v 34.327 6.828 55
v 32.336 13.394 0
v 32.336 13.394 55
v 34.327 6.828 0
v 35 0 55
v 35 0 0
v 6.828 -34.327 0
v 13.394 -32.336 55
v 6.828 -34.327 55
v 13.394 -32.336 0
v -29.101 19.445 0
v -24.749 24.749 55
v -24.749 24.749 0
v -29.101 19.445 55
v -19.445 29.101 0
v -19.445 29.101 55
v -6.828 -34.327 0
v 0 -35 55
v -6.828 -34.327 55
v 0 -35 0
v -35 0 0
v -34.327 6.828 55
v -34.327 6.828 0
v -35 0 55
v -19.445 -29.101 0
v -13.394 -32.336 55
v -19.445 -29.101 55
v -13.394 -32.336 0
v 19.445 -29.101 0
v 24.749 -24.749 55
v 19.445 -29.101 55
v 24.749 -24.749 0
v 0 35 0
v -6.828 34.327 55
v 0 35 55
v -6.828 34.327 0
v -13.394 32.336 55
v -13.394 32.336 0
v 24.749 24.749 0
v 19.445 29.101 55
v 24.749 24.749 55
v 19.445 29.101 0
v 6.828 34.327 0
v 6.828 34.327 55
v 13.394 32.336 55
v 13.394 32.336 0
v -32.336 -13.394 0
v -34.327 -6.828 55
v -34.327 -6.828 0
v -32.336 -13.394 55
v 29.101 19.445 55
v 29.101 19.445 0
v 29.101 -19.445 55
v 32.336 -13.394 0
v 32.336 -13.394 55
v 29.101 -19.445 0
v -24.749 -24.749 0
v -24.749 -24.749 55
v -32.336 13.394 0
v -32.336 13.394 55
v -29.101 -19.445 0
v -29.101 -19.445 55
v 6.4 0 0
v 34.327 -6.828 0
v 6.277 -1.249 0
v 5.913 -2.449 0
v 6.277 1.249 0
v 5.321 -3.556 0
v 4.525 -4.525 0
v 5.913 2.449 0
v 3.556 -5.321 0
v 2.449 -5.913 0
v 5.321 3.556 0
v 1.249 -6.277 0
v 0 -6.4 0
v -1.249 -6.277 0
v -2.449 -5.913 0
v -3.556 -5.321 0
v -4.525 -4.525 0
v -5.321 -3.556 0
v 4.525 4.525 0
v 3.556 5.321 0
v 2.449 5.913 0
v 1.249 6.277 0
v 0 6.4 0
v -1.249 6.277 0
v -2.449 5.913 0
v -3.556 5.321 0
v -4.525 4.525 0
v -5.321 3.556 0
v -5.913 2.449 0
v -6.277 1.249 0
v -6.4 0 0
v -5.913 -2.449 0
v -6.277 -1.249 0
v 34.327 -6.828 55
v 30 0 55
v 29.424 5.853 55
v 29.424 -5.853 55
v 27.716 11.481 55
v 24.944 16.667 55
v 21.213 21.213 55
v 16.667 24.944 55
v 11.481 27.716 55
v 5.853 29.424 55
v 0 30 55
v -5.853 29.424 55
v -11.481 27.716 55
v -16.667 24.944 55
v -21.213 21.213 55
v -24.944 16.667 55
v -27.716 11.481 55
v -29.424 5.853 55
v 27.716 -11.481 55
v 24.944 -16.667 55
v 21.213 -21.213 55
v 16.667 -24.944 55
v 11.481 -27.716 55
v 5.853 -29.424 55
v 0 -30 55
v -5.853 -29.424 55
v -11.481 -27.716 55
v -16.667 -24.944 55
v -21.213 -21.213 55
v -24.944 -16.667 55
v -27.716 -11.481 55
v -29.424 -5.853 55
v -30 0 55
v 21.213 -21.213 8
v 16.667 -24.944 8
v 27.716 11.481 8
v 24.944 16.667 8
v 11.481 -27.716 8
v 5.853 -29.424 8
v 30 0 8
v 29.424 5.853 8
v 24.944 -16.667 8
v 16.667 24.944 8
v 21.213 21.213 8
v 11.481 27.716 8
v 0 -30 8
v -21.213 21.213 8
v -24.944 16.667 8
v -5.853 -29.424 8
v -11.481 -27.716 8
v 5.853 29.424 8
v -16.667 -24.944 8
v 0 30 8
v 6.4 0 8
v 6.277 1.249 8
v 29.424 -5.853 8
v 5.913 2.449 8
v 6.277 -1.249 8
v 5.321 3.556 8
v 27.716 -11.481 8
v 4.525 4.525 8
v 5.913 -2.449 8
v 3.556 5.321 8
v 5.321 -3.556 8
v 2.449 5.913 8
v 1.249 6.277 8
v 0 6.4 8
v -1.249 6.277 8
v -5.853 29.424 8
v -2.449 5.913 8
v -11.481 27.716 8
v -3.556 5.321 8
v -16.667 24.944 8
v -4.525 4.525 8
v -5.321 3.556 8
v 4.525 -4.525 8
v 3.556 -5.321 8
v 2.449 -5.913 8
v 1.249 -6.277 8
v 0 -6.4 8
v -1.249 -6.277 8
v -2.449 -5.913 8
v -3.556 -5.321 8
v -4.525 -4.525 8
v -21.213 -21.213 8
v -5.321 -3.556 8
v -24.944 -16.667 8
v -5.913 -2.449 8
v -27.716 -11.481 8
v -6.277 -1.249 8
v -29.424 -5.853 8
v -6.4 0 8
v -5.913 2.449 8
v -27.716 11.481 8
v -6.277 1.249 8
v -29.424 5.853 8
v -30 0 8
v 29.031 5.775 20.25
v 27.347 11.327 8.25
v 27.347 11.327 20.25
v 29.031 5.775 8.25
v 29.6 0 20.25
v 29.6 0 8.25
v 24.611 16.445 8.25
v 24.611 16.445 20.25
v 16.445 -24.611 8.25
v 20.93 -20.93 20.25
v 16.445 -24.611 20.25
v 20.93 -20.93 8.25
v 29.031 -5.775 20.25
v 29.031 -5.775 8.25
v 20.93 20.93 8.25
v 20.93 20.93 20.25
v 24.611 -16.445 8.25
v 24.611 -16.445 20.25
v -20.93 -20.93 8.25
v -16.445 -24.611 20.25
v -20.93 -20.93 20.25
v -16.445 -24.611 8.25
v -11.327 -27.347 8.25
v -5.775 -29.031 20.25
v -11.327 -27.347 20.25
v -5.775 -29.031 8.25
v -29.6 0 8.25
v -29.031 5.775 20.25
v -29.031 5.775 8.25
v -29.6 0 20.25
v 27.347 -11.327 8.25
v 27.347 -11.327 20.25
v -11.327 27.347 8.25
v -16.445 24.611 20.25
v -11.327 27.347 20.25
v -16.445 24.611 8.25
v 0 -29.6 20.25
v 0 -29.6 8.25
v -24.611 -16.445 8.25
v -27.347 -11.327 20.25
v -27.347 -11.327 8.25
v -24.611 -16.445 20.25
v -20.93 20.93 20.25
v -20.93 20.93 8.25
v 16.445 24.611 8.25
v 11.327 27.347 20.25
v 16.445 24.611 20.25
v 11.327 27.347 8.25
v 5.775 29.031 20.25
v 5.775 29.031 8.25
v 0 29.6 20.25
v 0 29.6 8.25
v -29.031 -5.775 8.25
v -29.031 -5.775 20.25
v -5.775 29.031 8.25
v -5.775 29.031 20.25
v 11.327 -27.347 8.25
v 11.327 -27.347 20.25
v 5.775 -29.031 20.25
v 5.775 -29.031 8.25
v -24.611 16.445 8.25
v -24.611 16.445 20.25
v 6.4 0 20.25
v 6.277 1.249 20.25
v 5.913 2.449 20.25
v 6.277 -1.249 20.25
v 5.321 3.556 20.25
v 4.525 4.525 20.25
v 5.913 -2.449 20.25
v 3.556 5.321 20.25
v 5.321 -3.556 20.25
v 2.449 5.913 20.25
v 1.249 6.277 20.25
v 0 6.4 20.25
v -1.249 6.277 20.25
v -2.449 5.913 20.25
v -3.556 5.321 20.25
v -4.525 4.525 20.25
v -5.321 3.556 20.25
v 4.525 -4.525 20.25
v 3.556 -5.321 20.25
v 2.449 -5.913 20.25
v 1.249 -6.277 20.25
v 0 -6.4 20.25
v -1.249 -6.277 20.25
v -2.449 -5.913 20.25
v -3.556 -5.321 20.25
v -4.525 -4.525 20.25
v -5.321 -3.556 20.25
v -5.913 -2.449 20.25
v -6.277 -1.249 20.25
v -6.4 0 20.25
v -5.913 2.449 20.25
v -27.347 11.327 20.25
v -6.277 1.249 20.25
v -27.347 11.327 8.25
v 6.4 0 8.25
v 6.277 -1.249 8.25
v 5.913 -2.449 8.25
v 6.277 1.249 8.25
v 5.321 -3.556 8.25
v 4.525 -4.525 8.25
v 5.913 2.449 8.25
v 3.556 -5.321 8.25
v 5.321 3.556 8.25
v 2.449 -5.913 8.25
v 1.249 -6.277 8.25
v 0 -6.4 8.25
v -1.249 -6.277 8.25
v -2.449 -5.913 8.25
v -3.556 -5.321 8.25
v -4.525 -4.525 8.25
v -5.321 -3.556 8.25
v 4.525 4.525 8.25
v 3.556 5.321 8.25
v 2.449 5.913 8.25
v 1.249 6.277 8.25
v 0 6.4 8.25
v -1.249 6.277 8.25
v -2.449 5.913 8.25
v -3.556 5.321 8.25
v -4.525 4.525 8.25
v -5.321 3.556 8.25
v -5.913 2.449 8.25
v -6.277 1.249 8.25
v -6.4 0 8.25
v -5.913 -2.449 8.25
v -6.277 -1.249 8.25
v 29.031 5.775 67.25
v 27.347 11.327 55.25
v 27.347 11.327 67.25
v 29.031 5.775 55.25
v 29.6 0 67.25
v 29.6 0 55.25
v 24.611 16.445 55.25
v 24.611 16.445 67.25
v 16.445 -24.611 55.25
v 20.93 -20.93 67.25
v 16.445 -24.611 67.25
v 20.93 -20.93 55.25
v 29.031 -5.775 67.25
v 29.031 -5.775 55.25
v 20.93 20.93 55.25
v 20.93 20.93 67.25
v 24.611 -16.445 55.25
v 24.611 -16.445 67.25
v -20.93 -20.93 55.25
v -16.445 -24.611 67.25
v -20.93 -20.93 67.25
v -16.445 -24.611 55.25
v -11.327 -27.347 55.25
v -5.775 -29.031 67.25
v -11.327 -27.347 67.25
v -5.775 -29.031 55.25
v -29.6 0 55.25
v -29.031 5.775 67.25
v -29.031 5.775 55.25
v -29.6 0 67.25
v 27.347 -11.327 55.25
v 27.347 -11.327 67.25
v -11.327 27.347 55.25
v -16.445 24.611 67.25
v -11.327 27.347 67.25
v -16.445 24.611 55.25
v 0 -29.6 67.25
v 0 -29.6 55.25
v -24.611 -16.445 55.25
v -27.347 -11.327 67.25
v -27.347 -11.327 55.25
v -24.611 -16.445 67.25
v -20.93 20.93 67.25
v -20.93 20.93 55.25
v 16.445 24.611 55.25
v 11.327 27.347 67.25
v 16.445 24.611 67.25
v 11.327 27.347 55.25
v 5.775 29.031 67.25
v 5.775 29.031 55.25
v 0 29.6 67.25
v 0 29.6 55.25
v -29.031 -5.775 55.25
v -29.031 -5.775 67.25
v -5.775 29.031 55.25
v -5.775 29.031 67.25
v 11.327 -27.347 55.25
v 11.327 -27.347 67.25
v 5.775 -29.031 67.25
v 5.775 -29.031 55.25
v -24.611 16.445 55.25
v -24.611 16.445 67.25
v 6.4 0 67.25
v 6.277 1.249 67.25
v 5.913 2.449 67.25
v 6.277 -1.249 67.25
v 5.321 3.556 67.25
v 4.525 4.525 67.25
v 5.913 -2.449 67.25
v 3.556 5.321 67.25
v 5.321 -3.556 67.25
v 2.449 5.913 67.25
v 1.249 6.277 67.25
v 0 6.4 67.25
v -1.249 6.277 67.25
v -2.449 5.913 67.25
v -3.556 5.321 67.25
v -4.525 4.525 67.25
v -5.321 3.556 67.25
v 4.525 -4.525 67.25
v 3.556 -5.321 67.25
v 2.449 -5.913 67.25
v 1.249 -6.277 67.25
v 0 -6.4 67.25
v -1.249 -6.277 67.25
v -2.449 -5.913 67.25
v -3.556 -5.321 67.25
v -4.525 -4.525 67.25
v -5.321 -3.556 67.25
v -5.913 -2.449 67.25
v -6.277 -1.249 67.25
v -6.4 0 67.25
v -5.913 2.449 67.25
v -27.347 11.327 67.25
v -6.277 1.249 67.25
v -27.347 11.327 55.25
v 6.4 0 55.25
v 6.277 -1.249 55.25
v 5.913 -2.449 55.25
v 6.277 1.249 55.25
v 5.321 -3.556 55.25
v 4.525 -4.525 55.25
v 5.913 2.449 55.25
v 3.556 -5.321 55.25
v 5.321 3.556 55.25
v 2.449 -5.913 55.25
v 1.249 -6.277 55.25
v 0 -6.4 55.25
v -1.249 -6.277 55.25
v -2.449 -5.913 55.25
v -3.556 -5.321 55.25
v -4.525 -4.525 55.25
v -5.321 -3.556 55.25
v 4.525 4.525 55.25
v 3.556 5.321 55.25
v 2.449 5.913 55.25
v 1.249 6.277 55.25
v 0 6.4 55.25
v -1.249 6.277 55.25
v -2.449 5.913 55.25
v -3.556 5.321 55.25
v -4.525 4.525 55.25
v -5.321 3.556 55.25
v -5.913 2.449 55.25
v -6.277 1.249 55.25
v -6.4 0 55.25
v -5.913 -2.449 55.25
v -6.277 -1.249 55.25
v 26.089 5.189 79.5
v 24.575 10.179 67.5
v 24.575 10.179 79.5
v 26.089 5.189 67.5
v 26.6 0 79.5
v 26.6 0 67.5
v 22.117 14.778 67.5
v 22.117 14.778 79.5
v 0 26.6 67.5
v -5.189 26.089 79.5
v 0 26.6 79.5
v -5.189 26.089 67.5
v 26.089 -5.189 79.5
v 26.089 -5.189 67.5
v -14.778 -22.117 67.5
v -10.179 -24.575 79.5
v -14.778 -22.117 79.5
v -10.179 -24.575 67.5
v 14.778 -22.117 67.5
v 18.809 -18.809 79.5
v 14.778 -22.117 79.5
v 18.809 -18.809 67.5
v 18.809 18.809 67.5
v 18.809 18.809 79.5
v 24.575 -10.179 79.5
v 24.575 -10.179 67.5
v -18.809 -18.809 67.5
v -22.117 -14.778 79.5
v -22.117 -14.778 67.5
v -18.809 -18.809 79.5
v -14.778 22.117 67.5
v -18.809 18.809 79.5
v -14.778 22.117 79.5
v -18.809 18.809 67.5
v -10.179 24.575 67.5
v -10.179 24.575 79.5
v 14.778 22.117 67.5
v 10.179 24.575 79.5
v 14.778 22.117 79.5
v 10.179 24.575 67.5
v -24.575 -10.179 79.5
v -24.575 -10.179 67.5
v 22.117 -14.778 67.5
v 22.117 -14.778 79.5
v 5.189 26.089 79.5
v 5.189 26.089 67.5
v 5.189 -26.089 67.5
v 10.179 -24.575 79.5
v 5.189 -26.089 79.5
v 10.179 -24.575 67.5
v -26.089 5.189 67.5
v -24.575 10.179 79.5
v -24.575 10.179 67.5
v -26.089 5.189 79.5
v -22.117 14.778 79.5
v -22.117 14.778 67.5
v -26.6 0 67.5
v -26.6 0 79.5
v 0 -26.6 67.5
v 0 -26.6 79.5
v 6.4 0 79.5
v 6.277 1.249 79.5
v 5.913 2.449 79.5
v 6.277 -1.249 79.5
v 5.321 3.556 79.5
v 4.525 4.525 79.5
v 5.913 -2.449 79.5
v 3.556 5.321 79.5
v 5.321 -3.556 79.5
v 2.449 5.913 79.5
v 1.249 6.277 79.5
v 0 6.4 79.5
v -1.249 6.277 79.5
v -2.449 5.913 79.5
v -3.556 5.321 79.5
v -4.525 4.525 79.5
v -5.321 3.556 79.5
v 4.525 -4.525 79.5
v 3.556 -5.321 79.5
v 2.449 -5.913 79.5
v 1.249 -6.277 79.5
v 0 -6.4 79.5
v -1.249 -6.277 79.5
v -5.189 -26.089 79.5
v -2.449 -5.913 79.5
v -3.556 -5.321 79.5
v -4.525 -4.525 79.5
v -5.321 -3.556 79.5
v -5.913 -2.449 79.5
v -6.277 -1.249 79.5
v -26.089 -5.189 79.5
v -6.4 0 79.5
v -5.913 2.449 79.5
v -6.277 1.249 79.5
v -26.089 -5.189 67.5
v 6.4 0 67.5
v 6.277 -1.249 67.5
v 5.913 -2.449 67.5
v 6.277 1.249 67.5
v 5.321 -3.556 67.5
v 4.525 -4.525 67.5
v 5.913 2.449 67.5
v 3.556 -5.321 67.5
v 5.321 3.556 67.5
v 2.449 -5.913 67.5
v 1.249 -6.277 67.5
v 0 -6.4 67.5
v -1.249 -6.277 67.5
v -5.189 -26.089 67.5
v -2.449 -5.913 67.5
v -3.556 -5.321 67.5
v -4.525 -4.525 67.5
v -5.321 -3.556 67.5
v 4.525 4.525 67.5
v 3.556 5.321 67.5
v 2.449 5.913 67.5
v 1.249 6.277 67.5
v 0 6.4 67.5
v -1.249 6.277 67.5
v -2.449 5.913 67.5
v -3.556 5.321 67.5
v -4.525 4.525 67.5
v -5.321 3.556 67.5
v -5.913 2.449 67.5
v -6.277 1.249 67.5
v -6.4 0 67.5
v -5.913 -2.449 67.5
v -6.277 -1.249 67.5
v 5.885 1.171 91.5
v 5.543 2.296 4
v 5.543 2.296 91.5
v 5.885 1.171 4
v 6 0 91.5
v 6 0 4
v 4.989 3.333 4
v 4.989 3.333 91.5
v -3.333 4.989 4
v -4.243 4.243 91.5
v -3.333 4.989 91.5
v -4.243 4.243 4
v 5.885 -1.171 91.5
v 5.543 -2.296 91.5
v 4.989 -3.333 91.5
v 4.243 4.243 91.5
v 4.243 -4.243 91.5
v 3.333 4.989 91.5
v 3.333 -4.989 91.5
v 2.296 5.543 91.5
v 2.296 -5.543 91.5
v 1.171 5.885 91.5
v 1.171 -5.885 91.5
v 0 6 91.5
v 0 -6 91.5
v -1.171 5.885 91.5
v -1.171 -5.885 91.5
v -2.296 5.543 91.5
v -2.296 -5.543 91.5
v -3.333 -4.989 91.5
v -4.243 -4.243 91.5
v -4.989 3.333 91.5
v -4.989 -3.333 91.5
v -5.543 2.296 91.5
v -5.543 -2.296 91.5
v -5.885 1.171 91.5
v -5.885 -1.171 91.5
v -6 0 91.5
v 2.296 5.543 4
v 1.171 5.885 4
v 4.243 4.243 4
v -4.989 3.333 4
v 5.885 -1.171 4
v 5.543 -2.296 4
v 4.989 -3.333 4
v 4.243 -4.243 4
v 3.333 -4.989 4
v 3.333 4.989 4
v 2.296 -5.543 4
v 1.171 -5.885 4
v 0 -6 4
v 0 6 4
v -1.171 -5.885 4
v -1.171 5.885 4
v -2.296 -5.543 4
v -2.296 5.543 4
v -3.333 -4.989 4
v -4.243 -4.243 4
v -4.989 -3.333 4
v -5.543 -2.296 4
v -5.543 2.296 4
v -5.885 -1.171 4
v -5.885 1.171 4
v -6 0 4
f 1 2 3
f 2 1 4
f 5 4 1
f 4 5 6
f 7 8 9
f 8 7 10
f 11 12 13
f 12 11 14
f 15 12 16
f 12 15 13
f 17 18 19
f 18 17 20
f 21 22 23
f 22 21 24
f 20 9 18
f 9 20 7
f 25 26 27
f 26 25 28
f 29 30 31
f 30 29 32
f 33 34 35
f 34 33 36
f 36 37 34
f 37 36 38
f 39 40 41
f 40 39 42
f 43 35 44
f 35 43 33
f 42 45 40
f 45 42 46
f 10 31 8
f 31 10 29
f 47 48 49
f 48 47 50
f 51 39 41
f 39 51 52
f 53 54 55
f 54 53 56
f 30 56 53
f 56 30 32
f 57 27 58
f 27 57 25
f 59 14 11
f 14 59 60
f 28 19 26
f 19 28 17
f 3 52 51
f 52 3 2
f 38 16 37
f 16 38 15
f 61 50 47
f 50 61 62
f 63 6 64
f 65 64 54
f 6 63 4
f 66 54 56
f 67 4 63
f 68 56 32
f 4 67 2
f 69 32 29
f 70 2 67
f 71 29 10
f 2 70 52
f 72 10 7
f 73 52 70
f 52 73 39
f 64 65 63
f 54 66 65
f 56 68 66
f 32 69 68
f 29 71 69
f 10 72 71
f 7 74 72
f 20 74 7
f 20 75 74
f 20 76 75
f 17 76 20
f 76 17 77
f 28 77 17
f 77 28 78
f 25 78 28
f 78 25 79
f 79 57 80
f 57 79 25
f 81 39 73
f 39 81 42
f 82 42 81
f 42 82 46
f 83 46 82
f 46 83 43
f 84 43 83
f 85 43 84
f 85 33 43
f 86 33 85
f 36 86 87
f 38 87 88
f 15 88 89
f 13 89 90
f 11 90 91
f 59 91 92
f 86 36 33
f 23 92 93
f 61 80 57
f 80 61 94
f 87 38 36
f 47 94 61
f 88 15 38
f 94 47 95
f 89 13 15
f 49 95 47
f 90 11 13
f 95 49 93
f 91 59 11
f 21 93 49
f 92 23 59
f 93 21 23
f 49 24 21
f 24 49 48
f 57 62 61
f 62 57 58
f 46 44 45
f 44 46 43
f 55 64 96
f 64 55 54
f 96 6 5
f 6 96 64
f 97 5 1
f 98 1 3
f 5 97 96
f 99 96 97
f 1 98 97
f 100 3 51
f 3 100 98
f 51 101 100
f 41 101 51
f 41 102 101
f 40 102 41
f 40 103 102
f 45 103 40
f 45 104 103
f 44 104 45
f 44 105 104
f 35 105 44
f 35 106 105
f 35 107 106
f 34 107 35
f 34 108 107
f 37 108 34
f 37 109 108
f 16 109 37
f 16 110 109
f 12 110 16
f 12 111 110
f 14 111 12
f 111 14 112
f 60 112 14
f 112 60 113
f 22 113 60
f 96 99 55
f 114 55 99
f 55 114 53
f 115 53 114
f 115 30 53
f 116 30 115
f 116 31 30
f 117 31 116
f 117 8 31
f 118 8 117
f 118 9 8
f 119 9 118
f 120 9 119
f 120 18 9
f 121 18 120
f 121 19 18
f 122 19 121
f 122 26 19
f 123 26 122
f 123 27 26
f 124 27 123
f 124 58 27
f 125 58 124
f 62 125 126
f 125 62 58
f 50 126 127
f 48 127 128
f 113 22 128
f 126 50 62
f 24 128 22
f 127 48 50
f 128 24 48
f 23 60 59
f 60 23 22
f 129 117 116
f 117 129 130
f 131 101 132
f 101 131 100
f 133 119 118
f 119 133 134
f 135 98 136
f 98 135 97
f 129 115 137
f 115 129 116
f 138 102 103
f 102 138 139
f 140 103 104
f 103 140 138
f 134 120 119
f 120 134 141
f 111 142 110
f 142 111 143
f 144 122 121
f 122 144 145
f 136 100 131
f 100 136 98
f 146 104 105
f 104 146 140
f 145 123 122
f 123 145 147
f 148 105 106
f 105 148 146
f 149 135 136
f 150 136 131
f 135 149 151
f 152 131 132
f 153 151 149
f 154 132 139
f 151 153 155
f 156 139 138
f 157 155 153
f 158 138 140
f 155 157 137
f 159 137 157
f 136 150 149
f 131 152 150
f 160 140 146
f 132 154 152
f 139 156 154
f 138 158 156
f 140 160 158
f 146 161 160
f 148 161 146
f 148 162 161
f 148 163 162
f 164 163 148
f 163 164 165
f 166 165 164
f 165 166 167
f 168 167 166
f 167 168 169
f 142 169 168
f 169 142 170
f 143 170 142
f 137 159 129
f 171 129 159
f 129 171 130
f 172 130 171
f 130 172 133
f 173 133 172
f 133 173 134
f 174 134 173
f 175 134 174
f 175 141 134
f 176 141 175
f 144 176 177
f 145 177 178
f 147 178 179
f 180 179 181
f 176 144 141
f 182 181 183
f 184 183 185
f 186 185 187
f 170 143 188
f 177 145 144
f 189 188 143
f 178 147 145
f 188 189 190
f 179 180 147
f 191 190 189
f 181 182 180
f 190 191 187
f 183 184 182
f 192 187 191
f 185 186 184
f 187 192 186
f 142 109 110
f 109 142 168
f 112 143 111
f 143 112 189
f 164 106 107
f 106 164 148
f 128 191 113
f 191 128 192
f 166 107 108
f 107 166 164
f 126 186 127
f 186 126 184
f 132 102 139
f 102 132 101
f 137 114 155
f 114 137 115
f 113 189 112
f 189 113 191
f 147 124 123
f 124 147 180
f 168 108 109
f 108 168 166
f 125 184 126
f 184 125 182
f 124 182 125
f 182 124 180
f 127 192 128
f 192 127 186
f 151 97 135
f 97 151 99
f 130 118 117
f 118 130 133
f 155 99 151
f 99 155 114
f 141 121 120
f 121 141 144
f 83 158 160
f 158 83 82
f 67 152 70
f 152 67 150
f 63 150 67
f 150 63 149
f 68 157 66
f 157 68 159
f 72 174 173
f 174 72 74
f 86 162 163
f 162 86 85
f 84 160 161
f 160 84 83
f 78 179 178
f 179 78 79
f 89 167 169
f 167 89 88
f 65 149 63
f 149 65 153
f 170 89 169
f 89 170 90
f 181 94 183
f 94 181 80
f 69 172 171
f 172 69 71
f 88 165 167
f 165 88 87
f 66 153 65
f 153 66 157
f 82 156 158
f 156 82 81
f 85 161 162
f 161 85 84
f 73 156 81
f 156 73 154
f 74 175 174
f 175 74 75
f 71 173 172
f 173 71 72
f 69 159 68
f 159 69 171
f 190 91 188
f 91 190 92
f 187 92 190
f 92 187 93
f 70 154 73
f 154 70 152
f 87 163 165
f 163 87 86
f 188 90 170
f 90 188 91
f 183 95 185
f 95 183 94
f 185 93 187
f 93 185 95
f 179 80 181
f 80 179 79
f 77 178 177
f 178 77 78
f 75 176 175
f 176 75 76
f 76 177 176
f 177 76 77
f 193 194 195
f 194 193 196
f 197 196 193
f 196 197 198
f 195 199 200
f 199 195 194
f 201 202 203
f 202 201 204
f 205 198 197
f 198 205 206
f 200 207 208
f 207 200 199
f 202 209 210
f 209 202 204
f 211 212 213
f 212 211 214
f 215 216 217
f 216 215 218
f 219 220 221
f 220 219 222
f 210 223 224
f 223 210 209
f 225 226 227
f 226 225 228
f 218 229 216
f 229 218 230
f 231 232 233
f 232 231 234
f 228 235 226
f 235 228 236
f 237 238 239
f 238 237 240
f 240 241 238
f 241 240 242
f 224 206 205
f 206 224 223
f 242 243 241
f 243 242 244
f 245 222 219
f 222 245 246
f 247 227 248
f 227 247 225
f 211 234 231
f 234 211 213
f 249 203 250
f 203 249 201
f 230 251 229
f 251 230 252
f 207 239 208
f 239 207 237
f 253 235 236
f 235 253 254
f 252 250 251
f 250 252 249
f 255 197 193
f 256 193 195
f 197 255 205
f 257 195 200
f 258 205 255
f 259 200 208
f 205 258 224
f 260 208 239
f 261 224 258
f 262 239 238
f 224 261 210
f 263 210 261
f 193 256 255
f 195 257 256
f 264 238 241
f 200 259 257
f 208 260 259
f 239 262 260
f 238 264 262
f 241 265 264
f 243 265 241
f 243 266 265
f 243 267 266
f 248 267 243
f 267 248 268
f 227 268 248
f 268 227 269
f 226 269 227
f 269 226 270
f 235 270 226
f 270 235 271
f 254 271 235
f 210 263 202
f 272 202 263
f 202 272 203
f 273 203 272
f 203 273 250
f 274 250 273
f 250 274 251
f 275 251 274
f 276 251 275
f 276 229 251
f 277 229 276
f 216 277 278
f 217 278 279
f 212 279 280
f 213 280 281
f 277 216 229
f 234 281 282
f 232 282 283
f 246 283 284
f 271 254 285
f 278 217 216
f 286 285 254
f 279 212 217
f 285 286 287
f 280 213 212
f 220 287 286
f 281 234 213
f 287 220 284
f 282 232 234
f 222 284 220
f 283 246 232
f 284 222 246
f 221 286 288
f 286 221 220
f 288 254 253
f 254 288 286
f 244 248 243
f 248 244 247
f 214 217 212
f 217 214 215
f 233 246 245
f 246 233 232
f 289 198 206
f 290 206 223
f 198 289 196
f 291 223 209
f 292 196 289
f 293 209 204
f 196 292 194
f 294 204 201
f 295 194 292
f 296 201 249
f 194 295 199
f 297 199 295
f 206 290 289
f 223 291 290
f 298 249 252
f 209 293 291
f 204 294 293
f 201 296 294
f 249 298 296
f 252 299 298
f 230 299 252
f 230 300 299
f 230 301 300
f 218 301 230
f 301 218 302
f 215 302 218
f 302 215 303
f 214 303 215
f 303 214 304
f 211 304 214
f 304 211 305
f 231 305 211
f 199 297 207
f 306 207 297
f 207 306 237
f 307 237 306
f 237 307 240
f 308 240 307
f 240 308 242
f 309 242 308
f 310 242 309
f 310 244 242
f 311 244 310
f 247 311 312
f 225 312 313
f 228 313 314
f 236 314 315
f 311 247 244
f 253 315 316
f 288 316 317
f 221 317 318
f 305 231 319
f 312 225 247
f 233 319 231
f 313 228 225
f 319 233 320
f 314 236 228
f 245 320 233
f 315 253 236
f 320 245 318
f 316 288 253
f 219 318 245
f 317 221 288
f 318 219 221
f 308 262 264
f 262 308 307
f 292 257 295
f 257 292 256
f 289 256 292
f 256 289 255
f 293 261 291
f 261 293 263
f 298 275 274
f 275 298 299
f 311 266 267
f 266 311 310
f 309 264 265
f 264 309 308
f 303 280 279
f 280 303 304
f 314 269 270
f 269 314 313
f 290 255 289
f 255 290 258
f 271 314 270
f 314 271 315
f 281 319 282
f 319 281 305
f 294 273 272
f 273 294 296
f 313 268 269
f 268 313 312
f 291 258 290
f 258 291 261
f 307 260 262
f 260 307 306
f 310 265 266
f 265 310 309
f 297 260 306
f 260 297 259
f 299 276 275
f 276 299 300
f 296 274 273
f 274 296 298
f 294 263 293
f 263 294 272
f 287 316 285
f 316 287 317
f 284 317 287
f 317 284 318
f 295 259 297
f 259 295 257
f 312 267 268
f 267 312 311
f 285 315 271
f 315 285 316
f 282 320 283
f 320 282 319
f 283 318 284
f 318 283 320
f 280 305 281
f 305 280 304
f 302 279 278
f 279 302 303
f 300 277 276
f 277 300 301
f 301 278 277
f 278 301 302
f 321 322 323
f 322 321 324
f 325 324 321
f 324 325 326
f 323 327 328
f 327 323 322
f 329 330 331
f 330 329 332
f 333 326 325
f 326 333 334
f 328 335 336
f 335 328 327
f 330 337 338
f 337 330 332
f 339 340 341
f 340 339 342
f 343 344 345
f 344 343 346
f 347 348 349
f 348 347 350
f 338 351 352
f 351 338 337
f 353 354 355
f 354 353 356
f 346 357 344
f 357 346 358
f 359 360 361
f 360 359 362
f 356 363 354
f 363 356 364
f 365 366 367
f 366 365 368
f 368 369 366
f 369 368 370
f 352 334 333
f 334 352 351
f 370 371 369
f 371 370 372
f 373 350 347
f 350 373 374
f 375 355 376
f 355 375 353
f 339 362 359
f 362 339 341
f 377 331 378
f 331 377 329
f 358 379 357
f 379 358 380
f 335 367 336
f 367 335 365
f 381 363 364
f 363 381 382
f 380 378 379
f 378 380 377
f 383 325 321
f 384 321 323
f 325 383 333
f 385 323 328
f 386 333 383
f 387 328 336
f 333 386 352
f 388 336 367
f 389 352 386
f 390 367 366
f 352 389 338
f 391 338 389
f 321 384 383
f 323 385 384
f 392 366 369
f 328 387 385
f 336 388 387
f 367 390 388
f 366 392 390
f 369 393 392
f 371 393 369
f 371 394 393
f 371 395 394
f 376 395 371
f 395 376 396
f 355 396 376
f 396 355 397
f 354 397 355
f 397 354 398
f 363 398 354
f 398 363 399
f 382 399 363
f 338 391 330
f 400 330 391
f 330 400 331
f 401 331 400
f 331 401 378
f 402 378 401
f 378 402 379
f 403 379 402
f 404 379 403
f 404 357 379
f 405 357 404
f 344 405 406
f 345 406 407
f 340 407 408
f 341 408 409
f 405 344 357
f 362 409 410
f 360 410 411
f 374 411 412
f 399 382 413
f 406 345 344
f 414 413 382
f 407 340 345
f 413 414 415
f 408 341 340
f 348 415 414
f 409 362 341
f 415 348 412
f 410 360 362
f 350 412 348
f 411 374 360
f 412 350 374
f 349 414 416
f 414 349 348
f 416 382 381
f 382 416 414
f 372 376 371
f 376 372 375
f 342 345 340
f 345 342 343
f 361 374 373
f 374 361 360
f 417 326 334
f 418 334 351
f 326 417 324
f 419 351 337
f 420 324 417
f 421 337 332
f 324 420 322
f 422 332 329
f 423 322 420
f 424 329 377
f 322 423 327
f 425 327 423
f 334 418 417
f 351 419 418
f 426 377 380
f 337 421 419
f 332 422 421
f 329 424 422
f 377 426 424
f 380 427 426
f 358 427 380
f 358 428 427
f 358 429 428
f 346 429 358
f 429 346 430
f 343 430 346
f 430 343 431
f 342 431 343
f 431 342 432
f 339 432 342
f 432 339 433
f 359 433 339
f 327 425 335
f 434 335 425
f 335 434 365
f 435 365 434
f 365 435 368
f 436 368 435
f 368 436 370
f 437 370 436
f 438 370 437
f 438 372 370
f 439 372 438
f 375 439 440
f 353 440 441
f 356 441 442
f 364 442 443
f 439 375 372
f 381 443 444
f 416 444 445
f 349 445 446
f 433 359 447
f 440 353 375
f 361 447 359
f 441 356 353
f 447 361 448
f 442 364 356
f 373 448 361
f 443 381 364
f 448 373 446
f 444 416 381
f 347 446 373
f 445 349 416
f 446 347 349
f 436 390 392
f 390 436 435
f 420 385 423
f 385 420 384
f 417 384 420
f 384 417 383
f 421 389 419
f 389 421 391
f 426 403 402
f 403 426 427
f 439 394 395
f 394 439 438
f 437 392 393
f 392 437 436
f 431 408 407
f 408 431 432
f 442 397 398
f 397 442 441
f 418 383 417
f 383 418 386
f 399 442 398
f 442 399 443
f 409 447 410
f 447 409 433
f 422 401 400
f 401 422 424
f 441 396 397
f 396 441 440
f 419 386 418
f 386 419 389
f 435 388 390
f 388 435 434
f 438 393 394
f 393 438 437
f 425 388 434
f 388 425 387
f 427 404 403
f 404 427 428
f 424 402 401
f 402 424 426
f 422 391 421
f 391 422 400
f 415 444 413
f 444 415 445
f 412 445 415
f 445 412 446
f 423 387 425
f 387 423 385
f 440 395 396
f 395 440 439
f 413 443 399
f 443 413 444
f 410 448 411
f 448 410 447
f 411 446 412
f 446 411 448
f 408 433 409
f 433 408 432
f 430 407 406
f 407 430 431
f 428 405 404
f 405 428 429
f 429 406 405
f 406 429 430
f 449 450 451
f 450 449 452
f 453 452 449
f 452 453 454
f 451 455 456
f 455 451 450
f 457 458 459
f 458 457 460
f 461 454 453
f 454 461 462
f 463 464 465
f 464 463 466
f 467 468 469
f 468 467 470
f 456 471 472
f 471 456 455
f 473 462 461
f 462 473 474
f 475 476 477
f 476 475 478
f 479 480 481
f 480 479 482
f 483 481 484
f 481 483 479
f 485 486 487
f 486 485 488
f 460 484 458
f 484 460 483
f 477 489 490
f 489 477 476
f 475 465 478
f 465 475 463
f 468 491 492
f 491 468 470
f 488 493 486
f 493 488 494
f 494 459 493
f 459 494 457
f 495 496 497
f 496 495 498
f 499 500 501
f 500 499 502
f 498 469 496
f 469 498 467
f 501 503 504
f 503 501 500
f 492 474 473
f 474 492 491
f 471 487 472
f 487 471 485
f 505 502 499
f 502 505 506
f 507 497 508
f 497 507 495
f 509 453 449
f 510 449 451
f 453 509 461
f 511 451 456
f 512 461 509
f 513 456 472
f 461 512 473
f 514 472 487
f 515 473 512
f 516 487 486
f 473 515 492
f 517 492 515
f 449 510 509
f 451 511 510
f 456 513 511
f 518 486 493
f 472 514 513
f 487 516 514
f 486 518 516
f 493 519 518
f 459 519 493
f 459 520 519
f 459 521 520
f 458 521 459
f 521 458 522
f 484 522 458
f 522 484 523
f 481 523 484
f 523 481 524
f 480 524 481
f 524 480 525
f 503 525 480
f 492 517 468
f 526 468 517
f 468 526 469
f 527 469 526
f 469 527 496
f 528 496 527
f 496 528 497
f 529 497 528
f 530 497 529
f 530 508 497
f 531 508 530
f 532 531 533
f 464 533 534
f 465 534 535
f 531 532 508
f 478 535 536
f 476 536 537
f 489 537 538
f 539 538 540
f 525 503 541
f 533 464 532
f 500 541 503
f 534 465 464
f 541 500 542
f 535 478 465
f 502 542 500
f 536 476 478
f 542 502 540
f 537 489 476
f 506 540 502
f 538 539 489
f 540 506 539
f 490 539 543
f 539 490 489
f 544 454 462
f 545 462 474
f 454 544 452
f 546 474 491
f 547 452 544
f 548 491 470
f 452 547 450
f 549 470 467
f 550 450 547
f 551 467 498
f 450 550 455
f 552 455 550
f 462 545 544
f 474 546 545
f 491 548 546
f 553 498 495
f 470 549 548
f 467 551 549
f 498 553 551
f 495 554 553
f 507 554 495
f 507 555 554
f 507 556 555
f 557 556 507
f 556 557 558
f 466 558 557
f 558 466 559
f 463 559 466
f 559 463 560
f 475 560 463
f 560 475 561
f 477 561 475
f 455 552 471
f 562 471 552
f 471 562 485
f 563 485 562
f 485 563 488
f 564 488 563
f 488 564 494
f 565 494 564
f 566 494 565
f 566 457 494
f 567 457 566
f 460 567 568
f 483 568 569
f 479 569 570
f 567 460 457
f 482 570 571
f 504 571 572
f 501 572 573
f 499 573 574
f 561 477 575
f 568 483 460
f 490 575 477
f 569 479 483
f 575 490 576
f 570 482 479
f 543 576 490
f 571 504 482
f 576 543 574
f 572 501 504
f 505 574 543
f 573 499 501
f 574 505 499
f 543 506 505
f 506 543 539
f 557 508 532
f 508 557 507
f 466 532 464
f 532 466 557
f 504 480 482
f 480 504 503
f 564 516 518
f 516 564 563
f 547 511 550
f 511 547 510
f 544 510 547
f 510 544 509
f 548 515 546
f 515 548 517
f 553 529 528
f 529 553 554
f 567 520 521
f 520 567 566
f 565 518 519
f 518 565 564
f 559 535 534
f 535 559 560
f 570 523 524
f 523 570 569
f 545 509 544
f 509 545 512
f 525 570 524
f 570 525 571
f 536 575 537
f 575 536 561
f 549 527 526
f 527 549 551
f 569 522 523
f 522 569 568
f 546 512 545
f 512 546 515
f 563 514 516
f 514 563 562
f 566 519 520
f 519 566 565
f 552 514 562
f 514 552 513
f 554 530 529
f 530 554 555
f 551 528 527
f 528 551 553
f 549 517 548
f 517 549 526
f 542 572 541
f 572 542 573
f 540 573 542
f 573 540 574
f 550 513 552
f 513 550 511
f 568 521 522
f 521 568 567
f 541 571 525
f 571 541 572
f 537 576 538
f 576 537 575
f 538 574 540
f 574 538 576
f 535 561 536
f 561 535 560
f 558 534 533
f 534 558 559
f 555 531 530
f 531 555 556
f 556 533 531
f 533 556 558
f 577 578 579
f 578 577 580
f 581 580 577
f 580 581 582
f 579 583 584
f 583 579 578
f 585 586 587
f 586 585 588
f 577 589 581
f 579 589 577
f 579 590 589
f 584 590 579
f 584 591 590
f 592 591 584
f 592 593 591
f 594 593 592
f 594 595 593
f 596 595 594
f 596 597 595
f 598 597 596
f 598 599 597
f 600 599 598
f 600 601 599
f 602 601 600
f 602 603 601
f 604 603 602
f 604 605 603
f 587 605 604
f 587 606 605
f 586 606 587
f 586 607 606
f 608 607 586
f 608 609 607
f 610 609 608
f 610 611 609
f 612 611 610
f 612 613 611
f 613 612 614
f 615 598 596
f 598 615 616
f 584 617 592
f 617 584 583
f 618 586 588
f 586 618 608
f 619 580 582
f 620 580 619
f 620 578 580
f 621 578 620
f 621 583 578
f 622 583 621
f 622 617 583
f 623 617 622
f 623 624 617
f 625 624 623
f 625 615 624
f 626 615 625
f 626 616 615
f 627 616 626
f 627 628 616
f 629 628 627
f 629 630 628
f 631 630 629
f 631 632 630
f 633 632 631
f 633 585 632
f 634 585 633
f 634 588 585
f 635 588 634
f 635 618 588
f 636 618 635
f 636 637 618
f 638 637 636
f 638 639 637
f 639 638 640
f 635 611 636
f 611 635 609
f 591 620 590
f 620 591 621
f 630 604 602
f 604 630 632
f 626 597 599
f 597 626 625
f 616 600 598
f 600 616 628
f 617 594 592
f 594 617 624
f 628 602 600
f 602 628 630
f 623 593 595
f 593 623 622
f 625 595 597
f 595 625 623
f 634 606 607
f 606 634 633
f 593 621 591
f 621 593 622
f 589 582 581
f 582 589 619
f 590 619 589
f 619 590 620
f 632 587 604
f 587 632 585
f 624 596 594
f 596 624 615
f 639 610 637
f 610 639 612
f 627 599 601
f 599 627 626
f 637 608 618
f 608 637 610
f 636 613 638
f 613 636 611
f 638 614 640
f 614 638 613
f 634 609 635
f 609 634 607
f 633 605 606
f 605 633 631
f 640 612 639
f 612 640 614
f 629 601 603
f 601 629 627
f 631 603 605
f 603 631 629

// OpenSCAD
$fn = 32;

// ------------------------------------------------------------------------
// Bearing housing: housing d70, two bearings and a shaft
// Every part is its own module, assembly() places them once.
// ------------------------------------------------------------------------

// --- part 1 ---
module housing() {
  difference() {
    cylinder(h = 55, d = 70);
    translate([0, 0, 8]) cylinder(h = 48, d = 60);
    translate([0, 0, -1]) cylinder(h = 10, d = 12.8);
  }
}

// --- part 2 ---
module bearing_lower() {
  difference() {
      translate([0, 0, 0]) cylinder(h = 12, d = 59.2);
      translate([0, 0, -1]) cylinder(h = 14, d = 12.8);
    }
}

// --- part 3 ---
module bearing_upper() {
  difference() {
      translate([0, 0, 0]) cylinder(h = 12, d = 59.2);
      translate([0, 0, -1]) cylinder(h = 14, d = 12.8);
    }
}

// --- part 4 ---
module spacer() {
  difference() {
      translate([0, 0, 0]) cylinder(h = 12, d = 53.2);
      translate([0, 0, -1]) cylinder(h = 14, d = 12.8);
    }
}

// --- part 5 ---
module shaft() {
  translate([0, 0, -43.75]) cylinder(h = 87.5, d = 12);
}

// --- assembly ---
module assembly() {
  translate([0, 0, 0]) rotate([0, 0, 0]) housing();
  translate([0, 0, 8.25]) rotate([0, 0, 0]) bearing_lower();
  translate([0, 0, 55.25]) rotate([0, 0, 0]) bearing_upper();
  translate([0, 0, 67.5]) rotate([0, 0, 0]) spacer();
  translate([0, 0, 47.75]) rotate([0, 0, 0]) shaft();
}

assembly();
